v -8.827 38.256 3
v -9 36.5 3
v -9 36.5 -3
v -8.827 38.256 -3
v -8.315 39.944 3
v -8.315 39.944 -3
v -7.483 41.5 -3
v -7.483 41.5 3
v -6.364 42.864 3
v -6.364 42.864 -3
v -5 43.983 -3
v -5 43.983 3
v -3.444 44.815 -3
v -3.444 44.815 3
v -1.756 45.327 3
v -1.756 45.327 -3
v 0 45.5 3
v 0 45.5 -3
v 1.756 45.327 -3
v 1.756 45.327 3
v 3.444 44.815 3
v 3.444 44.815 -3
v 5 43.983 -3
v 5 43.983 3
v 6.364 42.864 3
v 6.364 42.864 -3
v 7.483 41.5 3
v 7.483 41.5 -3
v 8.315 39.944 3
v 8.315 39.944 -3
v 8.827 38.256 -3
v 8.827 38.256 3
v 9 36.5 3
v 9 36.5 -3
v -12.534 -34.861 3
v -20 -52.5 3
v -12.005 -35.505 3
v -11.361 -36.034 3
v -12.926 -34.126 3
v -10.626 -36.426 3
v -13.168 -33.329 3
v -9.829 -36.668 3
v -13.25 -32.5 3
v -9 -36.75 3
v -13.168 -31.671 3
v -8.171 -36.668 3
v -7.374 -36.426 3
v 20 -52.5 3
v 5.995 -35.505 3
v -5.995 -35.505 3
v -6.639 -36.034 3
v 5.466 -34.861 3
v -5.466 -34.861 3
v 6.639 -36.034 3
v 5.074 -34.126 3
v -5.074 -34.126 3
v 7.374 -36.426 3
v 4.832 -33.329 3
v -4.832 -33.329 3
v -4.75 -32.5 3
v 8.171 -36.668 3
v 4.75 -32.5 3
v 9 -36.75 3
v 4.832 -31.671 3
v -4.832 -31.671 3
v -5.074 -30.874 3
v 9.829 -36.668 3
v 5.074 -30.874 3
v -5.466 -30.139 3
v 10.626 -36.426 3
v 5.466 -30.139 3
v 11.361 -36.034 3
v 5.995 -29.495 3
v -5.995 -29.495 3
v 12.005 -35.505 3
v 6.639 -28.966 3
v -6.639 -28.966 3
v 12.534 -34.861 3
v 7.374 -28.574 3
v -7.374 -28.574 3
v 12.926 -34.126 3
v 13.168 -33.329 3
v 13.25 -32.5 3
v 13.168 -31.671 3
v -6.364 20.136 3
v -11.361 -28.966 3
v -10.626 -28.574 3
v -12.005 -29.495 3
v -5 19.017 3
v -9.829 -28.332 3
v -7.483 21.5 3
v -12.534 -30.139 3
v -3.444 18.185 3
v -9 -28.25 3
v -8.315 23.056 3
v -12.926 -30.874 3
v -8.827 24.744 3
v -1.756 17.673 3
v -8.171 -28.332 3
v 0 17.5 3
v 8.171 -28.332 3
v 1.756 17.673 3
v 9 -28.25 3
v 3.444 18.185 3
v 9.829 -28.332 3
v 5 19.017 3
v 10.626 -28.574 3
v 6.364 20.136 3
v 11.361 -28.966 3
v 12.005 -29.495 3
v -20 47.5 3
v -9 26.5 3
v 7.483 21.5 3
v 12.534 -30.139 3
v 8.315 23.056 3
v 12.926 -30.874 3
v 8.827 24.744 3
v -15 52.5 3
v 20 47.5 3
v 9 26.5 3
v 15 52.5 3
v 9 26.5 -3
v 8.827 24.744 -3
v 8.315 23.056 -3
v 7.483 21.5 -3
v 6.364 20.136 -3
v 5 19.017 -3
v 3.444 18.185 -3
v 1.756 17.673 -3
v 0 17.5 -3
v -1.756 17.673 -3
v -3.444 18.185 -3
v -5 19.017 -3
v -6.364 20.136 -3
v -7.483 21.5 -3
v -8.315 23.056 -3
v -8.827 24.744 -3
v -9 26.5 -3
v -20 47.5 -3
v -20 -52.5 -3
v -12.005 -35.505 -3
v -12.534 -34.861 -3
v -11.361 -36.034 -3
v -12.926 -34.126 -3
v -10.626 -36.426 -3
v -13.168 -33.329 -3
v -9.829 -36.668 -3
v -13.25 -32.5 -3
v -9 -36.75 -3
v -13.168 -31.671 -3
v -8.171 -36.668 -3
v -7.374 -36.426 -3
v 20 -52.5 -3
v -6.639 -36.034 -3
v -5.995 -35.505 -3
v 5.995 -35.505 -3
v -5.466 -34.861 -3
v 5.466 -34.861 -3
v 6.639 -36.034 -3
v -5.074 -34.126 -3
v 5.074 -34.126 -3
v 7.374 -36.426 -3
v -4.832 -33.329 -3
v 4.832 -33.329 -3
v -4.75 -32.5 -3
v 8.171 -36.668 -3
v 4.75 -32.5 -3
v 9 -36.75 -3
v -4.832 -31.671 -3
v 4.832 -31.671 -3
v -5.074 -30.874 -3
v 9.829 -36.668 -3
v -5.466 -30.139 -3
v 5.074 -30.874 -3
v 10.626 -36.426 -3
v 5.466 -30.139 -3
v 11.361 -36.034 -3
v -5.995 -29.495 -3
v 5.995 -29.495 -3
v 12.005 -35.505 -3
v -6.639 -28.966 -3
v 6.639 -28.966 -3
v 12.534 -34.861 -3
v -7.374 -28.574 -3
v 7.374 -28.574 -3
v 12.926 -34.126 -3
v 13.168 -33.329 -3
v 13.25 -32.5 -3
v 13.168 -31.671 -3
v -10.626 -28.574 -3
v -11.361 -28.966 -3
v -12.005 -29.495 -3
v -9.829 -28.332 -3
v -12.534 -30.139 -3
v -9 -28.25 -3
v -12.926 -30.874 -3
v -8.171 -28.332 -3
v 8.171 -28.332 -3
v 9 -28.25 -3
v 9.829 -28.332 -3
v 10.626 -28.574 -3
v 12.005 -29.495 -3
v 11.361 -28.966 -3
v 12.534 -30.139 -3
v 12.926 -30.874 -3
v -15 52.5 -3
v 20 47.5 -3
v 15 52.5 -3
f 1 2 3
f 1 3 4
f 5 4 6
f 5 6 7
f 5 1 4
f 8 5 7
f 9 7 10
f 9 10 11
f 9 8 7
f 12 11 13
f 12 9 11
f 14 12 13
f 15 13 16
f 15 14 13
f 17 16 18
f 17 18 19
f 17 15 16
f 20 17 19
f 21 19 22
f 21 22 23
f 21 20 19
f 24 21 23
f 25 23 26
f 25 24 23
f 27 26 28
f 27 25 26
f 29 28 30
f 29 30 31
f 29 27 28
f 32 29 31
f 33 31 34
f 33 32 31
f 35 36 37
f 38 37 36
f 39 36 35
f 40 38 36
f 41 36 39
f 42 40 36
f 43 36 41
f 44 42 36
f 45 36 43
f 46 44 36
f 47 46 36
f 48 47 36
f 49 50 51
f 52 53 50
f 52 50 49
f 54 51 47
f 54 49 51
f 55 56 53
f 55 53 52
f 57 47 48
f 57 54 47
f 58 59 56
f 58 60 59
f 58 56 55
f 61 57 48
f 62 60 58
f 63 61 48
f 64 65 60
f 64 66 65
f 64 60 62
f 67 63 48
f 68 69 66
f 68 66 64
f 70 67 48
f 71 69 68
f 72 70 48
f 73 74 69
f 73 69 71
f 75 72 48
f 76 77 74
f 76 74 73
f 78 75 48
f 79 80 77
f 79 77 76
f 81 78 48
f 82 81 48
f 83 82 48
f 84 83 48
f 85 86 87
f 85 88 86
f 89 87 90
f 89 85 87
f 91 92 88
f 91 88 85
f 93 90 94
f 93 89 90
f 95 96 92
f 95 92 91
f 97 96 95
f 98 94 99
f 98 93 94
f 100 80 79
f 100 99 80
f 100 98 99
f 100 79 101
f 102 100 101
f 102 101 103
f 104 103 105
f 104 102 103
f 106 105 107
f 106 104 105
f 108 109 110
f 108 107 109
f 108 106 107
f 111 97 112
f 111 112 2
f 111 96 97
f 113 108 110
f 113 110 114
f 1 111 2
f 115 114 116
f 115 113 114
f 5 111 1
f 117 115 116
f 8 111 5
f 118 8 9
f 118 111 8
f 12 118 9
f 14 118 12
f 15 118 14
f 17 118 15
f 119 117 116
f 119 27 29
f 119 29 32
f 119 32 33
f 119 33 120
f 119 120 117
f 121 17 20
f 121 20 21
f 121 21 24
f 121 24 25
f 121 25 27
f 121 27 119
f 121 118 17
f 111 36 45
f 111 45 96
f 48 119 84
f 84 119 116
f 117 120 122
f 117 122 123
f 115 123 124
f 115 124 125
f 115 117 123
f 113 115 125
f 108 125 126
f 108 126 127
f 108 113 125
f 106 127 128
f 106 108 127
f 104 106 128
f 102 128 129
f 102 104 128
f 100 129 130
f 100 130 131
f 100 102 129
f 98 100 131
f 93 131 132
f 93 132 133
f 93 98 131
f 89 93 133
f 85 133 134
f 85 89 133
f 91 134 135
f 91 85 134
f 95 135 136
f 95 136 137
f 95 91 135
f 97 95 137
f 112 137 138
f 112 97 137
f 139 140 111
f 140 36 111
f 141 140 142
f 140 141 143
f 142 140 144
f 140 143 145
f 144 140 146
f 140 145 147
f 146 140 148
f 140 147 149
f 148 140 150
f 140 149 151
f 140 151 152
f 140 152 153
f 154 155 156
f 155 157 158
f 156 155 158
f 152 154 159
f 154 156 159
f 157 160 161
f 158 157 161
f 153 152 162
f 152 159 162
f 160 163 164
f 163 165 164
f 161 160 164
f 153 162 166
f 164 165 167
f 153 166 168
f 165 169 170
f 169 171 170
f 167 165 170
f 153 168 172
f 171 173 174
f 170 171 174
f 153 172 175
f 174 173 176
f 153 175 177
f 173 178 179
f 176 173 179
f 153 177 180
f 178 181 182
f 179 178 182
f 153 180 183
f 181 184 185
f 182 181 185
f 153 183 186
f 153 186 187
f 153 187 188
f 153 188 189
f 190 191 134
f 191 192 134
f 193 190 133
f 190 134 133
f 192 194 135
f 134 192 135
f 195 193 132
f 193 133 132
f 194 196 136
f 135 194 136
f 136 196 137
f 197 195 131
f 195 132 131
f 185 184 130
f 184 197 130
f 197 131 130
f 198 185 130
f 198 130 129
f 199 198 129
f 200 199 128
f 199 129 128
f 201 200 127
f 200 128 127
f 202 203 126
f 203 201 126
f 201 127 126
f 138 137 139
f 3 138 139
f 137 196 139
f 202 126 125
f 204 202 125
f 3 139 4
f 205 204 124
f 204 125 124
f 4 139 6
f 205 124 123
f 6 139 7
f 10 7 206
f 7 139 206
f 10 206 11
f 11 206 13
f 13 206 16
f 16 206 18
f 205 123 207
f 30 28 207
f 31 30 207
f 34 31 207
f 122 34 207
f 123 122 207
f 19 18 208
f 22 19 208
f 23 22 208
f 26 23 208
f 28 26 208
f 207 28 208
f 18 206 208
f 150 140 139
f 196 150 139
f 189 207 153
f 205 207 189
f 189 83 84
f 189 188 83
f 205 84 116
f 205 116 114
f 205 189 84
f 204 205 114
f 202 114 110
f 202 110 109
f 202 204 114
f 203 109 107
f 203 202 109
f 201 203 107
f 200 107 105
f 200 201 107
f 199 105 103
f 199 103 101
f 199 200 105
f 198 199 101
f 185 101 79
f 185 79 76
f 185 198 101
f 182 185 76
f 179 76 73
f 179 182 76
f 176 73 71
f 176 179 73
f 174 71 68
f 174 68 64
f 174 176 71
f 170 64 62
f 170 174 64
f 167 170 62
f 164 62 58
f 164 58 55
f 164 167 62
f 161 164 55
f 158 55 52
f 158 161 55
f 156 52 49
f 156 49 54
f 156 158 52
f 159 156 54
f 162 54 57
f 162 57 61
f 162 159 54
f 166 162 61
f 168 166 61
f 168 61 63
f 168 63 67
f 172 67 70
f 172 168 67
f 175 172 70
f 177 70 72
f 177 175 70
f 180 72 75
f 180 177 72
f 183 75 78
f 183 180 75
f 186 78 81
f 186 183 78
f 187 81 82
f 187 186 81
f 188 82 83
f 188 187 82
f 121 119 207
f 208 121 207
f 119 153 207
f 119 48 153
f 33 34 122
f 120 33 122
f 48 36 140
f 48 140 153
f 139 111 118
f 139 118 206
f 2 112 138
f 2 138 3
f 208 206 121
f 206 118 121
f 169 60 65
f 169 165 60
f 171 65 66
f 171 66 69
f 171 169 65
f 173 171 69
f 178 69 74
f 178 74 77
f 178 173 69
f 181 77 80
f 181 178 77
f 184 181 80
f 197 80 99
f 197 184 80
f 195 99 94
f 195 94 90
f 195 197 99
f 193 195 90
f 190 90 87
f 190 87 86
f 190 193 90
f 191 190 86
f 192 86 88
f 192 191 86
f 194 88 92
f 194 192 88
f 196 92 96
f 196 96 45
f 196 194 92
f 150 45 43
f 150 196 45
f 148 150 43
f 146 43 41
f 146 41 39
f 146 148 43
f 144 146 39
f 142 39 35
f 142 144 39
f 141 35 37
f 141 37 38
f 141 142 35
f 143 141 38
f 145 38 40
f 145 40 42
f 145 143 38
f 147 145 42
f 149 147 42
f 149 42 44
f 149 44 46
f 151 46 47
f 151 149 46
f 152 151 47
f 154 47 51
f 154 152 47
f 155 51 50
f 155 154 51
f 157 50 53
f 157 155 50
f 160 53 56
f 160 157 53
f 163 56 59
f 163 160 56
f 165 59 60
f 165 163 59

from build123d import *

# Parameters (mm, degrees)
SKETCH1_W           = 40
SKETCH1_H           = 105
SKETCH1_R           = 4.25
BOSS_EXTRUDE1_DEPTH = 3
CHAMFER1_SIZE       = 5


with BuildPart() as part:
    # Sketch1 → Boss-Extrude1 (new body, symmetric)
    with BuildSketch(Plane.XY):
        Rectangle(SKETCH1_W, SKETCH1_H)
        with Locations((9, -32.5)):
            Circle(SKETCH1_R, mode=Mode.SUBTRACT)
        with Locations((-9, -32.5)):
            Circle(SKETCH1_R, mode=Mode.SUBTRACT)
        with BuildLine():
            Line((9, 36.5), (9, 26.5))
            ThreePointArc((9, 26.5), (0, 17.5), (-9, 26.5))
            Line((-9, 26.5), (-9, 36.5))
            ThreePointArc((-9, 36.5), (0, 45.5), (9, 36.5))
        make_face(mode=Mode.SUBTRACT)
    extrude(amount=BOSS_EXTRUDE1_DEPTH, both=True)

    # Chamfer1
    chamfer1_edges = [part.edges().sort_by_distance(p)[0] for p in [
        (-20, 52.5, 0),
        (20, 52.5, 0),
    ]]
    chamfer(chamfer1_edges, length=CHAMFER1_SIZE)


solid = part.part
